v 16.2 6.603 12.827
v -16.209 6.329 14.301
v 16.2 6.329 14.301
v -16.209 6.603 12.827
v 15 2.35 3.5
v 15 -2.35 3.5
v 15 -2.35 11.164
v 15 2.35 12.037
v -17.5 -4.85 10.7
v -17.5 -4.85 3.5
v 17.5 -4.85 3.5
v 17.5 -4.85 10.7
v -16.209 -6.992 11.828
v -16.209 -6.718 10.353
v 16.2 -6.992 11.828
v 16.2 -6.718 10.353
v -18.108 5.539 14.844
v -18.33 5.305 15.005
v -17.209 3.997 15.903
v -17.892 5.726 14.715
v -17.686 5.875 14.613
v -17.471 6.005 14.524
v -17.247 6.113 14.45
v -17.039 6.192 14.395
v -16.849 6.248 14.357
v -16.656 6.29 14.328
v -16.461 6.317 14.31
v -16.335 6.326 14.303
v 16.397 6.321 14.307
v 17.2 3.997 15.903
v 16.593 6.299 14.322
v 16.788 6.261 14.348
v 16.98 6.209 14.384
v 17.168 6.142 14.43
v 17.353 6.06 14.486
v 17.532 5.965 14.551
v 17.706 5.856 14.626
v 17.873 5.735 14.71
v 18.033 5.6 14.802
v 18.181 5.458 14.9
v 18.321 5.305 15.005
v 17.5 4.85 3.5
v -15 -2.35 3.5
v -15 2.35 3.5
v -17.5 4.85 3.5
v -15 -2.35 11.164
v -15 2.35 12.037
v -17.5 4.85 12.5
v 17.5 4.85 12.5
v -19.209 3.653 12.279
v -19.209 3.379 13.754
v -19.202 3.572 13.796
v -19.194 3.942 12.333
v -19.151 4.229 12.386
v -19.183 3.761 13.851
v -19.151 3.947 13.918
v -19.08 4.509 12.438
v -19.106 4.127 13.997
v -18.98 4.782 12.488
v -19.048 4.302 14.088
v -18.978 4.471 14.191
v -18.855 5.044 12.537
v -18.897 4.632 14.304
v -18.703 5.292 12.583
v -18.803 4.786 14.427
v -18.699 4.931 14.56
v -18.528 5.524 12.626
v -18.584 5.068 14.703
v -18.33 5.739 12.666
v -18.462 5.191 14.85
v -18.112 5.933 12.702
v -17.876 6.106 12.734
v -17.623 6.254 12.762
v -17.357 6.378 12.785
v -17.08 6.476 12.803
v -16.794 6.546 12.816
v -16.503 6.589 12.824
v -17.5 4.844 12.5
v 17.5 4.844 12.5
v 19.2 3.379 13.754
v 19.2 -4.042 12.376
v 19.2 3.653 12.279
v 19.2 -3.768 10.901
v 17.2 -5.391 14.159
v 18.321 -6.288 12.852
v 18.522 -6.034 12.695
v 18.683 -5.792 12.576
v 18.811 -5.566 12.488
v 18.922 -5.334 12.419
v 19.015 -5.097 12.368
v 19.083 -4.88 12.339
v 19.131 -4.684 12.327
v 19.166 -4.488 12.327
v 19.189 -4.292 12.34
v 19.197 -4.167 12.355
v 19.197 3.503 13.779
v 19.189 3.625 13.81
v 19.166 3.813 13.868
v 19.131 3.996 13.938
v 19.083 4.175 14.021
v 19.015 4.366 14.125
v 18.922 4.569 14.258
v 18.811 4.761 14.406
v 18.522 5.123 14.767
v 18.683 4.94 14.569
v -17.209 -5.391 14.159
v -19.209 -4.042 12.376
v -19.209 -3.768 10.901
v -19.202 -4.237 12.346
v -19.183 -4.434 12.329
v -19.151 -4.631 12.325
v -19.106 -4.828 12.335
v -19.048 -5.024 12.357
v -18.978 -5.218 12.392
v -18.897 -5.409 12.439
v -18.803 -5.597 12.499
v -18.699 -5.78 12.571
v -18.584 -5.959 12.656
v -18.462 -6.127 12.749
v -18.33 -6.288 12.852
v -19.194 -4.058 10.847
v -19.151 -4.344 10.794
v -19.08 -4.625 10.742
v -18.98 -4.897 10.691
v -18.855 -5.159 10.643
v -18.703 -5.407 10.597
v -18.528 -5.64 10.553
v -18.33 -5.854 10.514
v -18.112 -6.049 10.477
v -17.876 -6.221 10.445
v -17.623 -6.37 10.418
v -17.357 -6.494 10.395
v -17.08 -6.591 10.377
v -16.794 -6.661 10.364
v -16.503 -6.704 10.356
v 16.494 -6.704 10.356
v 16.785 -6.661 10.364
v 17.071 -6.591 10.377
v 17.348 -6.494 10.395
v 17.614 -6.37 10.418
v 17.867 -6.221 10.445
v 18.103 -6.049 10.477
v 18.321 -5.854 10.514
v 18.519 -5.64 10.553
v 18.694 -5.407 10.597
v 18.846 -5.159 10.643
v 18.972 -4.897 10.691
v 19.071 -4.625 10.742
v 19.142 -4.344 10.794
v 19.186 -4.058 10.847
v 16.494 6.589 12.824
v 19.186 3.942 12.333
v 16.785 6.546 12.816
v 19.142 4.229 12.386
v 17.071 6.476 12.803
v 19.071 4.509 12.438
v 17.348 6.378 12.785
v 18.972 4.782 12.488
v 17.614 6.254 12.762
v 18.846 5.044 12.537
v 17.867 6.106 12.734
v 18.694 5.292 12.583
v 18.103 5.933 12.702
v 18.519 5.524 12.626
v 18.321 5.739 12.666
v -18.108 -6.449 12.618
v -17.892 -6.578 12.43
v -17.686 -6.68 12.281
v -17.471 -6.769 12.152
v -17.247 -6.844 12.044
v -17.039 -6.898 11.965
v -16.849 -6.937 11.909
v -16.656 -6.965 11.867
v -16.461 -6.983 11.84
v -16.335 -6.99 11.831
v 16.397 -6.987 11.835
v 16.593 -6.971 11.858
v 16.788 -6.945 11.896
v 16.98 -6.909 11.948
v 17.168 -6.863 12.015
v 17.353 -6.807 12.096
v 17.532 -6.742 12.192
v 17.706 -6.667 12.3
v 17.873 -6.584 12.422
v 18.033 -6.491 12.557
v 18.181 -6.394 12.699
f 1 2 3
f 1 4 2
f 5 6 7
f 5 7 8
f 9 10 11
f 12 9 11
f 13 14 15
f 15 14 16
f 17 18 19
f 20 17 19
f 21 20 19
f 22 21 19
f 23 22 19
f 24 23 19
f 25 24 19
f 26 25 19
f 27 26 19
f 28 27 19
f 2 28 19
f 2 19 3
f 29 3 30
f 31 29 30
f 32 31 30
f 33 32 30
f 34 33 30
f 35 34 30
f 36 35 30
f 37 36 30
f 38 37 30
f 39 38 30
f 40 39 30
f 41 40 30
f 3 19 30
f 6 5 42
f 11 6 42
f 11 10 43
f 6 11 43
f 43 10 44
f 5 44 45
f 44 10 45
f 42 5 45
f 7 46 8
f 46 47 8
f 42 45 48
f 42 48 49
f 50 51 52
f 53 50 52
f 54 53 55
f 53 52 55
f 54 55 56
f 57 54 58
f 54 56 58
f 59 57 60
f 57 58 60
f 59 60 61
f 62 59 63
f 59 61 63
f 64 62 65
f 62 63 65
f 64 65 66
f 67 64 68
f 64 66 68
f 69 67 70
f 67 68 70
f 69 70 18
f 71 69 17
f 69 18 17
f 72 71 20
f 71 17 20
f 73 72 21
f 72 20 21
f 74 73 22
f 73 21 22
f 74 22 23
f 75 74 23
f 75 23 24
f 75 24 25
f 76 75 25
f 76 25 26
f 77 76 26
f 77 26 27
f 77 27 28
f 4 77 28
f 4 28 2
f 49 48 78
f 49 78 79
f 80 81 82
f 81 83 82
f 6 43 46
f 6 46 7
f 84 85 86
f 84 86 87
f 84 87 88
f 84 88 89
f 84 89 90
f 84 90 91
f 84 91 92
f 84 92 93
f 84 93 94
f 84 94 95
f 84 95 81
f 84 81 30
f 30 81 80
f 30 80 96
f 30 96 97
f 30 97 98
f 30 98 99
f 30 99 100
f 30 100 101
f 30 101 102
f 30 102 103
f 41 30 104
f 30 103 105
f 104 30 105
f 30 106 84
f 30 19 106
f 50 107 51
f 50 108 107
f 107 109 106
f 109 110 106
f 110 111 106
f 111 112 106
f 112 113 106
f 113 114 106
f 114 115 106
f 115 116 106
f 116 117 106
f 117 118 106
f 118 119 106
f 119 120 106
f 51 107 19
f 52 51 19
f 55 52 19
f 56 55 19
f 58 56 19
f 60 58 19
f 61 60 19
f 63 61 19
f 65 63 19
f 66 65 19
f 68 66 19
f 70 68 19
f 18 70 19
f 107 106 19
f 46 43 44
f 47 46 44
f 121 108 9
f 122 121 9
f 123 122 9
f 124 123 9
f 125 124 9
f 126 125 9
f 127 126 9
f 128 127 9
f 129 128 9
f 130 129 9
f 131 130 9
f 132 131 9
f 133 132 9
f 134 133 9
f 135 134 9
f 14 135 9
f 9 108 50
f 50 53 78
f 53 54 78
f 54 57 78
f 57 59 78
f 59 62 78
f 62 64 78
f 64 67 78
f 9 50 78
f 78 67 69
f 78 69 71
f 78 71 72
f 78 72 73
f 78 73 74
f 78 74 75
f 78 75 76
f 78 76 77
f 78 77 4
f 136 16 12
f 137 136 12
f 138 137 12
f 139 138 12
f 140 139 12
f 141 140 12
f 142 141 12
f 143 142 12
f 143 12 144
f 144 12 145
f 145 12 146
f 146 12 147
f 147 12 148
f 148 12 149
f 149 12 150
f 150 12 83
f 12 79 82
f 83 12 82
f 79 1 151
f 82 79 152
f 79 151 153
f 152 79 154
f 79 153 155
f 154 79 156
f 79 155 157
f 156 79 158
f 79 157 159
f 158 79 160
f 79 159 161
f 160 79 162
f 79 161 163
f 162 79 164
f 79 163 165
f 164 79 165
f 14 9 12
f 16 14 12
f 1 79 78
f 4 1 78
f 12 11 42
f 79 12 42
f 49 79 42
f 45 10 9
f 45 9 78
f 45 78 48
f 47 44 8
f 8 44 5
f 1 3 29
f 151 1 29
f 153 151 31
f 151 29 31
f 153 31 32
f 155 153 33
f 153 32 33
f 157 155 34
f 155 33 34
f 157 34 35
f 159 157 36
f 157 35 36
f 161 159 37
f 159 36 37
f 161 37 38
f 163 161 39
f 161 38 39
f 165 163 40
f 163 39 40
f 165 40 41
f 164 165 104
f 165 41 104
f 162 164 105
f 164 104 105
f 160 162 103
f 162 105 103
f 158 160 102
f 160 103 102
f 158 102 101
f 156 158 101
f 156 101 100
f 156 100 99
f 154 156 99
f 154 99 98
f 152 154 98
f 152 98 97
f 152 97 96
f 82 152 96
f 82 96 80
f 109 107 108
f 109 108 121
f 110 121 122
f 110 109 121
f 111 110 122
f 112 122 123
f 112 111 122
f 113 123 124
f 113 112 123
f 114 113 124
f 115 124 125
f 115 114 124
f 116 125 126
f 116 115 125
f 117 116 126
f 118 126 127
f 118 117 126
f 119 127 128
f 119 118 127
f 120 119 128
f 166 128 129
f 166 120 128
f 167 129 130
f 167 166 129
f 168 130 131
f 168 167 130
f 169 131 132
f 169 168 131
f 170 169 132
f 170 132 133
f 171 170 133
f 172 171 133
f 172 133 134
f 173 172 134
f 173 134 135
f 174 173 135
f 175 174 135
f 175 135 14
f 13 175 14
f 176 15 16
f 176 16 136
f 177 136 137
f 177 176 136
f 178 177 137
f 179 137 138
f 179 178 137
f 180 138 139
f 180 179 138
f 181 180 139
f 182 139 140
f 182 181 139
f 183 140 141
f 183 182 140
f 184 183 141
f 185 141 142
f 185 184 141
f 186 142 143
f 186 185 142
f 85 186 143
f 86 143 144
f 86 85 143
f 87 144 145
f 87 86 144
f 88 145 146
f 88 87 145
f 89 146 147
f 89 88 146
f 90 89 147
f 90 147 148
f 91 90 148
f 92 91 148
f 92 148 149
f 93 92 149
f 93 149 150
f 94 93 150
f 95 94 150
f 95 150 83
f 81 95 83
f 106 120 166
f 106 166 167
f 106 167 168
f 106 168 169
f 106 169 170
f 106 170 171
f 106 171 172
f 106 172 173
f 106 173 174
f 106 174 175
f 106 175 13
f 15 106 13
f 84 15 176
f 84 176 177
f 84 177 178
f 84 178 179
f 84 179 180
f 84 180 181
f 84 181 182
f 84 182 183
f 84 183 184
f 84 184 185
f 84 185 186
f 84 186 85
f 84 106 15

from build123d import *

# Parameters (mm, degrees)
F0_W      = 39
F0_H      = 14
F1_DEPTH  = 3.5
F2_W      = 35
F2_H      = 9.7
F2_W_2    = 30
F2_H_2    = 4.7
F3_DEPTH  = 9
F5_DEPTH  = 22.5
F6_W      = 38.4088279873
F6_H      = 13.5485363163
F7_DEPTH  = 3.5
F8_SIZE   = 2
F9_R      = 3
F10_DEPTH = 39.001


with BuildPart() as f1:
    # F0 (on Top) → F1 (new body)
    with BuildSketch(Plane.XY):
        Rectangle(F0_W, F0_H)
    extrude(amount=F1_DEPTH)

    # F2 (on face) → F3 (join)
    with BuildSketch(Plane.XY.offset(3.5)):
        Rectangle(F2_W, F2_H)
        Rectangle(F2_W_2, F2_H_2, mode=Mode.SUBTRACT)
    extrude(amount=F3_DEPTH)

    # F4 (on Right) → F5 (cut, symmetric)
    with BuildSketch(Plane.YZ):
        Polygon((-4.85, 10.7), (4.85, 12.501087971), (-5.2555450427, 12.884117032), align=None)
    extrude(amount=F5_DEPTH, both=True, mode=Mode.SUBTRACT)

    # F6 (on face) → F7 (join)
    with BuildSketch(Plane(origin=(0, -2.0821921756, 11.2139242658), x_dir=(1, 0, 0), z_dir=(0, -0.1825588214, 0.9831949332))):
        with Locations((-0.0044139937, 2.0591521208)):
            Rectangle(F6_W, F6_H)
    extrude(amount=F7_DEPTH)

    # F8
    f8_edges = [f1.edges().sort_by_distance(p)[0] for p in [
        (-0.004414, -7.357026, 13.794321),
        (19.2, -0.6966, 15.031023),
        (-0.004414, 5.963826, 16.267725),
        (-19.208828, -0.6966, 15.031023),
    ]]
    chamfer(f8_edges, length=F8_SIZE)

    # F9
    f9_edges = [f1.edges().sort_by_distance(p)[0] for p in [
        (19.2, -6.854989, 11.090534),
        (19.2, 6.465863, 13.563939),
        (-19.208828, 6.465863, 13.563939),
        (-19.208828, -6.854989, 11.090534),
    ]]
    fillet(f9_edges, radius=F9_R)

    # F10 (cut, through all): a face of the model
    f10_faces = [f1.faces().sort_by_distance(p)[0] for p in [
        (-19.5, 0, 1.75),
    ]]
    extrude(f10_faces, amount=-F10_DEPTH, mode=Mode.SUBTRACT)


solid = f1.part
